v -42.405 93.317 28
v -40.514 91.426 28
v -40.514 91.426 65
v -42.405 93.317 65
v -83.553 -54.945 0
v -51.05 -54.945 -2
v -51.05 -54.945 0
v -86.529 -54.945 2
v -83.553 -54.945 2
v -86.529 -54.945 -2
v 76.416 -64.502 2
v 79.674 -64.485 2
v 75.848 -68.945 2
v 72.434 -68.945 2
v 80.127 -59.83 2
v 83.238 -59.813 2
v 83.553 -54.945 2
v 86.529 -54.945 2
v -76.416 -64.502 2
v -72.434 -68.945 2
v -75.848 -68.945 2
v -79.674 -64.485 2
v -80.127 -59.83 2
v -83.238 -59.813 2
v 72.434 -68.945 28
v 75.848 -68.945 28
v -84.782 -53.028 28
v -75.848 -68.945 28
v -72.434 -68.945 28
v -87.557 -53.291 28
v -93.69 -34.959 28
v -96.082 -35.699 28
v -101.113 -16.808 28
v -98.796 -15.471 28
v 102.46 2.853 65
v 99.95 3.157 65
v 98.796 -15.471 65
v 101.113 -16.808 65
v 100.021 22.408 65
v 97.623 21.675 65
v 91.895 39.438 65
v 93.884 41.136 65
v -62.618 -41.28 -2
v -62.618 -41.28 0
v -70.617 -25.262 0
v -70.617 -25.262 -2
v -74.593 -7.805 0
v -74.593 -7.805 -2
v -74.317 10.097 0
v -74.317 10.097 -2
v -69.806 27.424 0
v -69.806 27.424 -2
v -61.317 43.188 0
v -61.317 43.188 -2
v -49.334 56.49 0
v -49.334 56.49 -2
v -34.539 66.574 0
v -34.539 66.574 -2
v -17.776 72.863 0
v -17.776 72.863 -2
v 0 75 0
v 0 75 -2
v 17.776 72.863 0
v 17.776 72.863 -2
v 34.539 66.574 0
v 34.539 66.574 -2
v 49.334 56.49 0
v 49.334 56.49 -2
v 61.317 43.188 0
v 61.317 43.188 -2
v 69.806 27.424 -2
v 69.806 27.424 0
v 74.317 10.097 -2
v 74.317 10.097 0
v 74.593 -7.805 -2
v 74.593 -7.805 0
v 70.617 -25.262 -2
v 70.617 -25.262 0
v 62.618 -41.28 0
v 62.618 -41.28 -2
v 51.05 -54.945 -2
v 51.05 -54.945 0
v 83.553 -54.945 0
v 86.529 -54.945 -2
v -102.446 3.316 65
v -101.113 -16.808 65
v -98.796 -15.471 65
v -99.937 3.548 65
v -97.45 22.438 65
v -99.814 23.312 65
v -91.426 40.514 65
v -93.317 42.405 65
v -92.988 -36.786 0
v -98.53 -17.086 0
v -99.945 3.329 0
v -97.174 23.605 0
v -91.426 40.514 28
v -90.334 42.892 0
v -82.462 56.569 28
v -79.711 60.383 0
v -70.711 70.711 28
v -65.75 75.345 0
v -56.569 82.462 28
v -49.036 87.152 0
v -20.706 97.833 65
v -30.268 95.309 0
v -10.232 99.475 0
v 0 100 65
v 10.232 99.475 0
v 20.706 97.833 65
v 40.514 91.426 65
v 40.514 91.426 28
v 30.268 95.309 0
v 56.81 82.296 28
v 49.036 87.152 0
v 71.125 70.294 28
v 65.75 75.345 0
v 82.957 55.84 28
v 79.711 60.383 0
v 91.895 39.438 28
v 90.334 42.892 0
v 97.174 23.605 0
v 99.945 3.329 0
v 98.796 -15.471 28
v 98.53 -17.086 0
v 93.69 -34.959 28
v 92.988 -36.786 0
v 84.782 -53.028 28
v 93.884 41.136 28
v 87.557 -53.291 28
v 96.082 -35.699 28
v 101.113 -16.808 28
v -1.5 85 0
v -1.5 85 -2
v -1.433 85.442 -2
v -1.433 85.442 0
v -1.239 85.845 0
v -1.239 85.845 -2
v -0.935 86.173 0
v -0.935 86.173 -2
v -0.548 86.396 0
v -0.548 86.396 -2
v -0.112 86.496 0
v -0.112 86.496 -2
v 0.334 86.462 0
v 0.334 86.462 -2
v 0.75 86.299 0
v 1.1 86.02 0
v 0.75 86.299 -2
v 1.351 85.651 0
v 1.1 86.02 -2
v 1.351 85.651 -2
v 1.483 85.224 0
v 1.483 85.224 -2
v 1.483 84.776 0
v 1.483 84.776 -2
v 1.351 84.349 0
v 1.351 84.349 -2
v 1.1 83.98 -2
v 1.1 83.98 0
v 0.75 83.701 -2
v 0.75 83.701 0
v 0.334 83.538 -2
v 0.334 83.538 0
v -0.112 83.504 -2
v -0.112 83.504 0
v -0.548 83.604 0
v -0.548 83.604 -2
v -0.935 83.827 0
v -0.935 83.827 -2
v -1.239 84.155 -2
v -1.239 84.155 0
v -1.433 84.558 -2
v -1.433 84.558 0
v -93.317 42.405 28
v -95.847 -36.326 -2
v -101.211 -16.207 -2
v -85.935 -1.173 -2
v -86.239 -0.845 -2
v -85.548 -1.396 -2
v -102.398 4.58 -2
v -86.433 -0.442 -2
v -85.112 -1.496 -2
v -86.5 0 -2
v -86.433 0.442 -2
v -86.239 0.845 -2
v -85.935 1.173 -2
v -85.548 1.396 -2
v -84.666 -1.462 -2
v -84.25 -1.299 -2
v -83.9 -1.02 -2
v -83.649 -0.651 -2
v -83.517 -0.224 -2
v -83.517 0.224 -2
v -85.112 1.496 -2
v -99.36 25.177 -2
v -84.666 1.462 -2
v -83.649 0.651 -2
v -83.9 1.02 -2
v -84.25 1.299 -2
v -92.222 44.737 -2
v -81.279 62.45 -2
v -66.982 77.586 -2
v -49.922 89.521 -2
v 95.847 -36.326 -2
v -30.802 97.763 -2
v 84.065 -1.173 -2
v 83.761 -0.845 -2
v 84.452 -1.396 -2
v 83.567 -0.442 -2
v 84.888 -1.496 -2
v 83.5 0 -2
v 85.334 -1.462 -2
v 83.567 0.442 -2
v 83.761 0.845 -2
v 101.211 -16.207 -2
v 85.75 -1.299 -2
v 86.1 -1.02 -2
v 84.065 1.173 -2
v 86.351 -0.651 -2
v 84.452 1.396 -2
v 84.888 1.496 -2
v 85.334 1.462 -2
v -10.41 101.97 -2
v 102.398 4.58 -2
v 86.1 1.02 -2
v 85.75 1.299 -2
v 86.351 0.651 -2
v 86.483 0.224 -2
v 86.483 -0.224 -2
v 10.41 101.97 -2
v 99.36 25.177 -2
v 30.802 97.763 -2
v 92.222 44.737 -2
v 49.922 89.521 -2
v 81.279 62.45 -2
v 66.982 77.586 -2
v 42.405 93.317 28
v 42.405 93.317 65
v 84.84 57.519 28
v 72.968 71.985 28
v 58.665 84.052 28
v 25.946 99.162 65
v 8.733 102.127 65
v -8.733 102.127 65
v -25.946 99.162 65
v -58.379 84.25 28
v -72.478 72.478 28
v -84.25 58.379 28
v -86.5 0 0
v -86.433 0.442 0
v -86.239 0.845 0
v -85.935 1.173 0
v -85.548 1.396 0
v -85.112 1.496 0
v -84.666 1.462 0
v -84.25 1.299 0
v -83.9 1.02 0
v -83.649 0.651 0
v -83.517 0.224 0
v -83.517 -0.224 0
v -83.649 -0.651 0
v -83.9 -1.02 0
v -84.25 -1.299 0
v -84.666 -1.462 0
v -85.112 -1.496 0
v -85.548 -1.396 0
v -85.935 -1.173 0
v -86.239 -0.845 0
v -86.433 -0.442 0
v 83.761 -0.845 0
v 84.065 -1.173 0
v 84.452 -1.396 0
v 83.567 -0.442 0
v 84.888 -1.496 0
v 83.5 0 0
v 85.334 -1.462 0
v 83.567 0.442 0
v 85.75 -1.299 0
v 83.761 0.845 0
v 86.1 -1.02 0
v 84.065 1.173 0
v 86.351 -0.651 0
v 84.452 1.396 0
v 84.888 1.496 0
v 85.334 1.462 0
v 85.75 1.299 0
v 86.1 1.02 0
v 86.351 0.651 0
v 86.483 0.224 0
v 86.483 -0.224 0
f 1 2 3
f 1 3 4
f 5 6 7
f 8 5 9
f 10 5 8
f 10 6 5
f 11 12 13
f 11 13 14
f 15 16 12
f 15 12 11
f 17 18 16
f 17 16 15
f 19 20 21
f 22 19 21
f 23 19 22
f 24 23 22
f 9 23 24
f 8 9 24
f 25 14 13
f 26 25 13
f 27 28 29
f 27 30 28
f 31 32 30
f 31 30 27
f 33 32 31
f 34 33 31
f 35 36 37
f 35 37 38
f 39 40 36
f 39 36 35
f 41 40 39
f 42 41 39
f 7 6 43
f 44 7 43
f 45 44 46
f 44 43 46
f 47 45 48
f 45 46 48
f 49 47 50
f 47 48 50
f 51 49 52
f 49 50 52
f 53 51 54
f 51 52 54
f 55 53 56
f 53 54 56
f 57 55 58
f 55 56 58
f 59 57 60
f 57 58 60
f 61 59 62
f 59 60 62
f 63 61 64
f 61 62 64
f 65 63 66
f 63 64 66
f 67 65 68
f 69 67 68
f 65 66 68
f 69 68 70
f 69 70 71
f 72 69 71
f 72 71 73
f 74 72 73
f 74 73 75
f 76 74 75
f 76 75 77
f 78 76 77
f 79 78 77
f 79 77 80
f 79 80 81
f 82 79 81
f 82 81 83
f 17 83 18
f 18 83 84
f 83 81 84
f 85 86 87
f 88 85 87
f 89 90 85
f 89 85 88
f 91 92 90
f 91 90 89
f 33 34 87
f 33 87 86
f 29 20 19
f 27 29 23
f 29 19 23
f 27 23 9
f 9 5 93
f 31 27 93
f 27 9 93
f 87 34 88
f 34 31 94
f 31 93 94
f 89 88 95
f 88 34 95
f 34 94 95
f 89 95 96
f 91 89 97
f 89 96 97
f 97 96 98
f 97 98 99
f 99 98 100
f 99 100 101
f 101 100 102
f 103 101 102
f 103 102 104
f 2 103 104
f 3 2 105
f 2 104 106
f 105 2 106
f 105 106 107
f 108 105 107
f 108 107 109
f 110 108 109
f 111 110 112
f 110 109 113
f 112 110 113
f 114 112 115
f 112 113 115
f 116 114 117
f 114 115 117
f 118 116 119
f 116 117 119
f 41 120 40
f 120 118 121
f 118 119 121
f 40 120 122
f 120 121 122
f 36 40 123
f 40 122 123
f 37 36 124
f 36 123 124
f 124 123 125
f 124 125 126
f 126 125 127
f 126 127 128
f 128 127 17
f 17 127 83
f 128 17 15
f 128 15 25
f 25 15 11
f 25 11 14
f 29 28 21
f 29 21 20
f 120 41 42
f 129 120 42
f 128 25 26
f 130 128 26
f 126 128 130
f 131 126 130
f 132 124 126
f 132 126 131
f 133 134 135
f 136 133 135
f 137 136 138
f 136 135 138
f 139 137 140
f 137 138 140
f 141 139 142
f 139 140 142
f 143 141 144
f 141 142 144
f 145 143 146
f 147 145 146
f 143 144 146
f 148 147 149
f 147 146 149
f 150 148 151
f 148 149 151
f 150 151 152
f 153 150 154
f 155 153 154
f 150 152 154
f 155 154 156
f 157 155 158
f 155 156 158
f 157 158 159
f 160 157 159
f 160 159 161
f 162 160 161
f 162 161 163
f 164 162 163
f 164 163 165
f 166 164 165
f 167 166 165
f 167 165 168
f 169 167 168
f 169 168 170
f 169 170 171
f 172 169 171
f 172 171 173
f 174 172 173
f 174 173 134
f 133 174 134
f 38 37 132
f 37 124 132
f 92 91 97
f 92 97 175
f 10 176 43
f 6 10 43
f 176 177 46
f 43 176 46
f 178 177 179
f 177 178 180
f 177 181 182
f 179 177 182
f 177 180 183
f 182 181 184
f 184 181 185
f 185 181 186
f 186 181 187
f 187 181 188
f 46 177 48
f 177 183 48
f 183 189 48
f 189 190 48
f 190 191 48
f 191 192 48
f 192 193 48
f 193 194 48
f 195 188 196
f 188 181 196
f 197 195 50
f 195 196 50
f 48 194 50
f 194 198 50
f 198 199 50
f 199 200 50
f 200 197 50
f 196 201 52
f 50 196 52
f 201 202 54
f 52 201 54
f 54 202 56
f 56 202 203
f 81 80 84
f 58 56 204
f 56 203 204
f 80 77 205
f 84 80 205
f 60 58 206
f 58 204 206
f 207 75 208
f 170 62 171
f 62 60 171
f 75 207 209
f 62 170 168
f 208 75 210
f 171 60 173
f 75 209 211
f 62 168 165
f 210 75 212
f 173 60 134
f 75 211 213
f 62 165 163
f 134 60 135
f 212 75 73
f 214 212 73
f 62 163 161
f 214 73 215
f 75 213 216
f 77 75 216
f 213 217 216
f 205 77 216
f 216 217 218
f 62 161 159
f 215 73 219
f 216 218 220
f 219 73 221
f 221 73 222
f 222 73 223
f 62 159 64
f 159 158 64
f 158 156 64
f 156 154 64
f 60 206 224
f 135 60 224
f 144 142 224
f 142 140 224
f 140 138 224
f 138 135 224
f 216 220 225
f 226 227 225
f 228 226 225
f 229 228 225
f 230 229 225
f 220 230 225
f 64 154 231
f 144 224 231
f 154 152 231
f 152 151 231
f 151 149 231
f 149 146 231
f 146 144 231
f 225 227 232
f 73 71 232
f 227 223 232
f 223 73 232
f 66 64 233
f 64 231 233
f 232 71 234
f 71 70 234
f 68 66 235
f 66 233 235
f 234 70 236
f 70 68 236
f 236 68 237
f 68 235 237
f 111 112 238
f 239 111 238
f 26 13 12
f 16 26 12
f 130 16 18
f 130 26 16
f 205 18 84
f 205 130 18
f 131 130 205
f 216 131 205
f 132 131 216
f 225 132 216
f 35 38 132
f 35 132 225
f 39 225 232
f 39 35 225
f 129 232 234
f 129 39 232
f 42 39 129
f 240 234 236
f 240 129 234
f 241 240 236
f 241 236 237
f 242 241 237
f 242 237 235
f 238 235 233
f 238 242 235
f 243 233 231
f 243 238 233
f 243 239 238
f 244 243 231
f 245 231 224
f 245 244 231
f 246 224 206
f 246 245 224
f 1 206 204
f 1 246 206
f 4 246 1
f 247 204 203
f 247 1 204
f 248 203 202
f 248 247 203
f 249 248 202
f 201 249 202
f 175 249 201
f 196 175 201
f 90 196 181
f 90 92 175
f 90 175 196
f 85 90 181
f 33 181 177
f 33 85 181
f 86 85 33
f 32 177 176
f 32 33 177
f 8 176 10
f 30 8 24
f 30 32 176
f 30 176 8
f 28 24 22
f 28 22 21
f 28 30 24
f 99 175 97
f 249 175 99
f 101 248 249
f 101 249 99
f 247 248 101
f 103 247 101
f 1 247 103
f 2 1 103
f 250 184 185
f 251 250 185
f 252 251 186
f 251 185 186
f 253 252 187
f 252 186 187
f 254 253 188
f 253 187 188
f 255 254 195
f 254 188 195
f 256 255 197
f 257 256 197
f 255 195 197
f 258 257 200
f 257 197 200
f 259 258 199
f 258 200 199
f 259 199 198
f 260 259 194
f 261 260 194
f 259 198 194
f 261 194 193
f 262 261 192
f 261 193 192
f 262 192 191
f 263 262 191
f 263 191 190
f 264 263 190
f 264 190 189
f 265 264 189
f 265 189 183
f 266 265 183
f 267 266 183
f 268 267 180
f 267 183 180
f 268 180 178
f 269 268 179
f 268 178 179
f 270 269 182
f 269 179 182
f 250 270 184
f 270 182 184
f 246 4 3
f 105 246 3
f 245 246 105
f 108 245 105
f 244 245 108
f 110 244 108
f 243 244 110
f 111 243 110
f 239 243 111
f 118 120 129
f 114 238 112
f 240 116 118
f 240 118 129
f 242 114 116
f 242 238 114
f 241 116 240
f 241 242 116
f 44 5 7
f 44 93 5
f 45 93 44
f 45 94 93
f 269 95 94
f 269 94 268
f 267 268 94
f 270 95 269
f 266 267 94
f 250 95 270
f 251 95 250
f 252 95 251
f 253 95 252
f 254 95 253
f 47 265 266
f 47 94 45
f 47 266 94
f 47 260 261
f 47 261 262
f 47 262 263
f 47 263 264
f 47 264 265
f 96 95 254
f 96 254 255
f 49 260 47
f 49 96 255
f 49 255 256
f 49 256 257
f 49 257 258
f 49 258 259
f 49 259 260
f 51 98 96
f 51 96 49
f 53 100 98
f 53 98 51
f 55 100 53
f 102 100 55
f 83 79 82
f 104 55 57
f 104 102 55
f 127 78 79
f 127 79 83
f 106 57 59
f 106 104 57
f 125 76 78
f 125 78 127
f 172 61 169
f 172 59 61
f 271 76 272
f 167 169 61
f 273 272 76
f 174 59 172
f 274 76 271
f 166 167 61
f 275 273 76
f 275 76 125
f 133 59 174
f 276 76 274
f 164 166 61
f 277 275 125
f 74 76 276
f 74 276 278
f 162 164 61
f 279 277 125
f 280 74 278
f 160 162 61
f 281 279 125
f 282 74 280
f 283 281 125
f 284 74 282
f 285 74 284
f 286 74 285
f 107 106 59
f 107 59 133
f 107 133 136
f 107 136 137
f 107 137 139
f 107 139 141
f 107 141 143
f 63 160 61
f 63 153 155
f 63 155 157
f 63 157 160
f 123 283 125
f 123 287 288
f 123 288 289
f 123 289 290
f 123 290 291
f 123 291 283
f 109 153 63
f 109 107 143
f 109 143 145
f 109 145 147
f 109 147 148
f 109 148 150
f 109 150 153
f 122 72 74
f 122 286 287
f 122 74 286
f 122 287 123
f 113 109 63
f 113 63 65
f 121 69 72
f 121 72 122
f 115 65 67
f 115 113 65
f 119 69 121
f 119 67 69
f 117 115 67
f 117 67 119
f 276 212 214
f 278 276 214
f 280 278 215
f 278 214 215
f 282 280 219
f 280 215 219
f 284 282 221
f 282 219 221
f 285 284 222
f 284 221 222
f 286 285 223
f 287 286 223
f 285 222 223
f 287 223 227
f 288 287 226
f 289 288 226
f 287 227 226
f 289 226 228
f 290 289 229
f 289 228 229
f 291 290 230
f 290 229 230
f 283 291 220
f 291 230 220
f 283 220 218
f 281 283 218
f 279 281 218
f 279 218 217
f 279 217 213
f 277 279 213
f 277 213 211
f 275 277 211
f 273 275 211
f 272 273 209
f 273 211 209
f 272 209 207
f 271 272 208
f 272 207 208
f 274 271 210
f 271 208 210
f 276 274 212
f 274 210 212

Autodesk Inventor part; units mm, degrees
ref_plane "YZ Plane" through (0, 0, 0) normal (1, 0, 0) x (0, 1, 0)
ref_plane "XZ Plane" through (0, 0, 0) normal (0, 1, 0) x (-1, 0, 0)
ref_plane "XY Plane" through (0, 0, 0) normal (0, 0, 1) x (1, 0, 0)
sketch "Sketch1" plane through (0, 0, 0) normal (0, 0, 1) x (1, 0, 0)
  arc A0 (72.4335, -68.9449) -> (-72.4335, -68.9449) centre (0, 0) ccw
  line L0 (0, 0) -> (0, -68.9449)
  arc A1 (75.8476, -68.9449) -> (-75.8476, -68.9449) centre (0, 0) ccw
  line L1 (0, 0) -> (88.7676, -51.25)
  line L2 (0, 0) -> (102.5, 0) construction
  line L3 (0, 0) -> (-88.7676, -51.25)
  line L4 (0, 0) -> (102.5, 0) construction
  line L5 (0, 0) -> (72.4784, 72.4784)
  line L6 (0, 0) -> (102.5, 0) construction
  line L7 (0, 0) -> (-72.4784, 72.4784)
  line L8 (0, 0) -> (102.5, 0) construction
  line L9 (0, 0) -> (-68.416, -39.5)
  line L10 (0, 0) -> (68.416, -39.5)
  line L11 (0, 0) -> (55.8614, 55.8614)
  line L12 (0, 0) -> (-55.8614, 55.8614)
  line L13 (-68.416, -39.5) -> (-51.416, -68.9449)
  line L14 (-68.416, -39.5) -> (-85.416, -10.0551)
  line L15 (68.416, -39.5) -> (51.416, -68.9449)
  line L16 (51.416, -68.9449) -> (68.416, -39.5)
  line L17 (68.416, -39.5) -> (85.416, -10.0551)
  line L18 (-51.416, -68.9449) -> (-75.8476, -68.9449)
  line L19 (-51.416, -68.9449) -> (51.416, -68.9449)
  line L20 (51.416, -68.9449) -> (75.8476, -68.9449)
  line L21 (85.416, -10.0551) -> (100.7418, -18.9035)
  line L22 (-85.416, -10.0551) -> (-100.7418, -18.9035)
  line L23 (-55.8614, 55.8614) -> (-79.9031, 31.8198)
  line L24 (-55.8614, 55.8614) -> (-31.8198, 79.9031)
  line L25 (55.8614, 55.8614) -> (79.9031, 31.8198)
  line L26 (55.8614, 55.8614) -> (31.8198, 79.9031)
  line L27 (-31.8198, 79.9031) -> (-44.3333, 92.4165)
  line L28 (-79.9031, 31.8198) -> (-92.4165, 44.3333)
  line L29 (31.8198, 79.9031) -> (44.3333, 92.4165)
  line L30 (79.9031, 31.8198) -> (92.4165, 44.3333)
  circle A2 centre (0, 0) radius 125
  line L31 (100.7418, -18.9035) -> (121.1717, -30.6987)
  line L32 (-100.7418, -18.9035) -> (-121.1717, -30.6987)
  line L33 (-92.4165, 44.3333) -> (-109.0975, 61.0142)
  line L34 (-44.3333, 92.4165) -> (-61.0142, 109.0975)
  line L35 (44.3333, 92.4165) -> (61.0142, 109.0975)
  line L36 (92.4165, 44.3333) -> (109.0975, 61.0142)
  circle A3 centre (0, 0) radius 120
  line L37 (-75.8476, -68.9449) -> (-104.267, -68.9449)
  line L38 (75.8476, -68.9449) -> (104.267, -68.9449)
  line L39 (68.416, -39.5) -> (86.416, -8.3231)
  line L40 (86.416, -8.3231) -> (121.6665, -28.675)
  line L41 (55.8614, 55.8614) -> (81.3173, 30.4056)
  line L42 (81.3173, 30.4056) -> (111.6152, 56.2764)
  line L43 (-68.416, -39.5) -> (-86.416, -8.3231)
  line L44 (-86.416, -8.3231) -> (-121.6665, -28.675)
  line L45 (-55.8614, 55.8614) -> (-81.3173, 30.4056)
  line L46 (-81.3173, 30.4056) -> (-110.0992, 59.1875)
  line L47 (-55.8614, 55.8614) -> (-30.4056, 81.3173)
  line L48 (-30.4056, 81.3173) -> (-59.1875, 110.0992)
  line L49 (55.8614, 55.8614) -> (30.4056, 81.3173)
  line L50 (30.4056, 81.3173) -> (59.1875, 110.0992)
  line L51 (68.416, -39.5) -> (50.416, -70.6769)
  line L52 (-68.416, -39.5) -> (-50.416, -70.6769)
  line L53 (51.416, -68.9449) -> (87.1717, -89.5884)
  line L54 (51.416, -68.9449) -> (92.7032, -68.9449) construction
  line L55 (50.416, -70.6769) -> (85.6665, -91.0288)
  line L56 (-50.416, -70.6769) -> (-85.6665, -91.0288)
  line L57 (-51.416, -68.9449) -> (-87.1717, -89.5884)
  point P0 (93.8835, 41.1356)
  point P1 (91.8949, 39.4376)
  point P2 (98.796, -15.4707)
  point P3 (101.1125, -16.8081)
  point P4 (40.5138, 91.4255)
  point P5 (42.4052, 93.3169)
  point P6 (-42.4052, 93.3169)
  point P7 (-40.5138, 91.4255)
  point P8 (-91.4255, 40.5138)
  point P9 (-93.3169, 42.4052)
  point P10 (-101.1125, -16.8081)
  point P11 (-98.796, -15.4707)
  point P12 (98.2171, -68.9449)
  point P13 (98.4432, -17.5764)
  point P14 (116.6644, -28.0964)
  point P15 (57.334, 105.4173)
  point P16 (105.4173, 57.334)
  point P17 (-105.4173, 57.334)
  point P18 (-57.334, 105.4173)
  point P19 (-98.2171, -68.9449)
  point P20 (-116.6644, -28.0964)
  point P21 (90.5398, 42.4565)
  point P22 (42.4565, 90.5398)
  point P23 (-42.4565, 90.5398)
  point P24 (-90.5398, 42.4565)
  point P25 (-98.4432, -17.5764)
  point P26 (-86.6025, -50)
  point P27 (-82.6644, -86.9862)
  point P28 (82.6644, -86.9862)
  dimension "d30" = 250
  dimension "d7" = 30
  dimension "d8" = 150
  dimension "d9" = 45
  dimension "d10" = 135
  dimension "d11" = 79
  dimension "d12" = 79
  dimension "d13" = 79
  dimension "d14" = 79
  dimension "d15" = 34
  dimension "d16" = 90
  dimension "d17" = 34
  dimension "d18" = 34
  dimension "d19" = 34
  dimension "d20" = 34
  dimension "d21" = 34
  dimension "d22" = 34
  dimension "d23" = 34
  dimension "d24" = 34
  dimension "d31" = 240
  dimension "d32" = 36
  dimension "d33" = 36
  dimension "d34" = 36
  dimension "d35" = 36
  dimension "d36" = 36
  dimension "d37" = 36
  dimension "d73" = 36
  dimension "d74" = 36
  dimension "d75" = 30
extrude "Extrusion3" add sketch "Sketch1" against normal blind 2 contours L20 L15 L1 A0 | A0 L1 A1 L20 | L1 L17 L21 A0 | A0 L21 A1 L1 | L19 L0 L1 L15 | L21 L39 L40 A0 | A0 L40 A1 L21 | L1 L5 L25 L41 L42 A0 L40 L39 L17 | L19 L13 L3 L0 | A0 L42 A1 L40 | L7 L24 L47 L48 A0 L50 L49 L26 L5 | L3 L14 L43 L44 A0 L46 L45 L23 L7 | L18 A0 L3 L13 | L42 L41 L30 A0 | A0 L30 A1 L42 | L3 A0 L22 L14 | L26 L29 A0 L5 | L5 A0 L30 L25 | L23 L28 A0 L7 | L7 A0 L27 L24 | L18 A1 L3 A0 | A0 L5 A1 L30 | L3 A1 L22 A0 | L22 A0 L44 L43 | A0 L29 A1 L5 | L49 L50 A0 L29 | L7 A1 L27 A0 | A0 L28 A1 L7 | L45 L46 A0 L28 | L27 A0 L48 L47 | L22 A1 L44 A0 | A0 L50 A1 L29 | L27 A1 L48 A0 | A0 L46 A1 L28 | L44 A1 L46 A0 | A0 L48 A1 L50
extrude "Extrusion4" add sketch "Sketch1" along normal blind 28 contours A0 L1 A1 L20 | A0 L21 A1 L1 | A0 L40 A1 L21 | A0 L42 A1 L40 | A0 L30 A1 L42 | L18 A1 L3 A0 | A0 L5 A1 L30 | L3 A1 L22 A0 | A0 L29 A1 L5 | L7 A1 L27 A0 | A0 L28 A1 L7 | L22 A1 L44 A0 | A0 L50 A1 L29 | L27 A1 L48 A0 | A0 L46 A1 L28 | L44 A1 L46 A0 | A0 L48 A1 L50
extrude "Extrusion5" add sketch "Sketch1" along normal blind 65 contours A0 L42 A1 L40 | L44 A1 L46 A0 | A0 L48 A1 L50
sketch "Sketch4" plane through (0, 0, -2) normal (0, 0, -1) x (-1, 0, 0)
  line L0 (0, 0) -> (-85, 0)
  line L1 (0, 0) -> (0, 85)
  line L2 (0, 0) -> (85, 0)
  circle A0 centre (-85, 0) radius 1.5
  circle A1 centre (0, 85) radius 1.5
  circle A2 centre (85, 0) radius 1.5
  circle A3 centre (0, 0) radius 75
  dimension "d60" = 85
  dimension "d61" = 85
  dimension "d62" = 85
  dimension "d63" = 3
  dimension "d64" = 3
  dimension "d65" = 3
  dimension "d66" = 150
extrude "Extrusion11" cut sketch "Sketch4" against normal blind 45
sketch "Sketch5" plane through (0, 0, -2) normal (0, 0, -1) x (-1, 0, 0)
  line L0 (72.4335, -68.9449) -> (-72.4335, -68.9449) projected
  line L1 (-72.4335, -68.9449) -> (-72.4335, -54.9449)
  line L2 (-72.4335, -54.9449) -> (129.3344, -54.9449)
  line L3 (129.3344, -54.9449) -> (-118.857, -54.9449)
  line L4 (-118.857, -54.9449) -> (-118.857, -84.9238)
  line L5 (-118.857, -84.9238) -> (129.3344, -84.9238)
  line L6 (129.3344, -84.9238) -> (129.3344, -54.9449)
  point P0 (0, 0)
  point P1 (-41.6566, -68.9449)
  dimension "d70" = 14
extrude "Extrusion12" cut sketch "Sketch5" against normal blind 4
properties part number "Falda-Parte1"
